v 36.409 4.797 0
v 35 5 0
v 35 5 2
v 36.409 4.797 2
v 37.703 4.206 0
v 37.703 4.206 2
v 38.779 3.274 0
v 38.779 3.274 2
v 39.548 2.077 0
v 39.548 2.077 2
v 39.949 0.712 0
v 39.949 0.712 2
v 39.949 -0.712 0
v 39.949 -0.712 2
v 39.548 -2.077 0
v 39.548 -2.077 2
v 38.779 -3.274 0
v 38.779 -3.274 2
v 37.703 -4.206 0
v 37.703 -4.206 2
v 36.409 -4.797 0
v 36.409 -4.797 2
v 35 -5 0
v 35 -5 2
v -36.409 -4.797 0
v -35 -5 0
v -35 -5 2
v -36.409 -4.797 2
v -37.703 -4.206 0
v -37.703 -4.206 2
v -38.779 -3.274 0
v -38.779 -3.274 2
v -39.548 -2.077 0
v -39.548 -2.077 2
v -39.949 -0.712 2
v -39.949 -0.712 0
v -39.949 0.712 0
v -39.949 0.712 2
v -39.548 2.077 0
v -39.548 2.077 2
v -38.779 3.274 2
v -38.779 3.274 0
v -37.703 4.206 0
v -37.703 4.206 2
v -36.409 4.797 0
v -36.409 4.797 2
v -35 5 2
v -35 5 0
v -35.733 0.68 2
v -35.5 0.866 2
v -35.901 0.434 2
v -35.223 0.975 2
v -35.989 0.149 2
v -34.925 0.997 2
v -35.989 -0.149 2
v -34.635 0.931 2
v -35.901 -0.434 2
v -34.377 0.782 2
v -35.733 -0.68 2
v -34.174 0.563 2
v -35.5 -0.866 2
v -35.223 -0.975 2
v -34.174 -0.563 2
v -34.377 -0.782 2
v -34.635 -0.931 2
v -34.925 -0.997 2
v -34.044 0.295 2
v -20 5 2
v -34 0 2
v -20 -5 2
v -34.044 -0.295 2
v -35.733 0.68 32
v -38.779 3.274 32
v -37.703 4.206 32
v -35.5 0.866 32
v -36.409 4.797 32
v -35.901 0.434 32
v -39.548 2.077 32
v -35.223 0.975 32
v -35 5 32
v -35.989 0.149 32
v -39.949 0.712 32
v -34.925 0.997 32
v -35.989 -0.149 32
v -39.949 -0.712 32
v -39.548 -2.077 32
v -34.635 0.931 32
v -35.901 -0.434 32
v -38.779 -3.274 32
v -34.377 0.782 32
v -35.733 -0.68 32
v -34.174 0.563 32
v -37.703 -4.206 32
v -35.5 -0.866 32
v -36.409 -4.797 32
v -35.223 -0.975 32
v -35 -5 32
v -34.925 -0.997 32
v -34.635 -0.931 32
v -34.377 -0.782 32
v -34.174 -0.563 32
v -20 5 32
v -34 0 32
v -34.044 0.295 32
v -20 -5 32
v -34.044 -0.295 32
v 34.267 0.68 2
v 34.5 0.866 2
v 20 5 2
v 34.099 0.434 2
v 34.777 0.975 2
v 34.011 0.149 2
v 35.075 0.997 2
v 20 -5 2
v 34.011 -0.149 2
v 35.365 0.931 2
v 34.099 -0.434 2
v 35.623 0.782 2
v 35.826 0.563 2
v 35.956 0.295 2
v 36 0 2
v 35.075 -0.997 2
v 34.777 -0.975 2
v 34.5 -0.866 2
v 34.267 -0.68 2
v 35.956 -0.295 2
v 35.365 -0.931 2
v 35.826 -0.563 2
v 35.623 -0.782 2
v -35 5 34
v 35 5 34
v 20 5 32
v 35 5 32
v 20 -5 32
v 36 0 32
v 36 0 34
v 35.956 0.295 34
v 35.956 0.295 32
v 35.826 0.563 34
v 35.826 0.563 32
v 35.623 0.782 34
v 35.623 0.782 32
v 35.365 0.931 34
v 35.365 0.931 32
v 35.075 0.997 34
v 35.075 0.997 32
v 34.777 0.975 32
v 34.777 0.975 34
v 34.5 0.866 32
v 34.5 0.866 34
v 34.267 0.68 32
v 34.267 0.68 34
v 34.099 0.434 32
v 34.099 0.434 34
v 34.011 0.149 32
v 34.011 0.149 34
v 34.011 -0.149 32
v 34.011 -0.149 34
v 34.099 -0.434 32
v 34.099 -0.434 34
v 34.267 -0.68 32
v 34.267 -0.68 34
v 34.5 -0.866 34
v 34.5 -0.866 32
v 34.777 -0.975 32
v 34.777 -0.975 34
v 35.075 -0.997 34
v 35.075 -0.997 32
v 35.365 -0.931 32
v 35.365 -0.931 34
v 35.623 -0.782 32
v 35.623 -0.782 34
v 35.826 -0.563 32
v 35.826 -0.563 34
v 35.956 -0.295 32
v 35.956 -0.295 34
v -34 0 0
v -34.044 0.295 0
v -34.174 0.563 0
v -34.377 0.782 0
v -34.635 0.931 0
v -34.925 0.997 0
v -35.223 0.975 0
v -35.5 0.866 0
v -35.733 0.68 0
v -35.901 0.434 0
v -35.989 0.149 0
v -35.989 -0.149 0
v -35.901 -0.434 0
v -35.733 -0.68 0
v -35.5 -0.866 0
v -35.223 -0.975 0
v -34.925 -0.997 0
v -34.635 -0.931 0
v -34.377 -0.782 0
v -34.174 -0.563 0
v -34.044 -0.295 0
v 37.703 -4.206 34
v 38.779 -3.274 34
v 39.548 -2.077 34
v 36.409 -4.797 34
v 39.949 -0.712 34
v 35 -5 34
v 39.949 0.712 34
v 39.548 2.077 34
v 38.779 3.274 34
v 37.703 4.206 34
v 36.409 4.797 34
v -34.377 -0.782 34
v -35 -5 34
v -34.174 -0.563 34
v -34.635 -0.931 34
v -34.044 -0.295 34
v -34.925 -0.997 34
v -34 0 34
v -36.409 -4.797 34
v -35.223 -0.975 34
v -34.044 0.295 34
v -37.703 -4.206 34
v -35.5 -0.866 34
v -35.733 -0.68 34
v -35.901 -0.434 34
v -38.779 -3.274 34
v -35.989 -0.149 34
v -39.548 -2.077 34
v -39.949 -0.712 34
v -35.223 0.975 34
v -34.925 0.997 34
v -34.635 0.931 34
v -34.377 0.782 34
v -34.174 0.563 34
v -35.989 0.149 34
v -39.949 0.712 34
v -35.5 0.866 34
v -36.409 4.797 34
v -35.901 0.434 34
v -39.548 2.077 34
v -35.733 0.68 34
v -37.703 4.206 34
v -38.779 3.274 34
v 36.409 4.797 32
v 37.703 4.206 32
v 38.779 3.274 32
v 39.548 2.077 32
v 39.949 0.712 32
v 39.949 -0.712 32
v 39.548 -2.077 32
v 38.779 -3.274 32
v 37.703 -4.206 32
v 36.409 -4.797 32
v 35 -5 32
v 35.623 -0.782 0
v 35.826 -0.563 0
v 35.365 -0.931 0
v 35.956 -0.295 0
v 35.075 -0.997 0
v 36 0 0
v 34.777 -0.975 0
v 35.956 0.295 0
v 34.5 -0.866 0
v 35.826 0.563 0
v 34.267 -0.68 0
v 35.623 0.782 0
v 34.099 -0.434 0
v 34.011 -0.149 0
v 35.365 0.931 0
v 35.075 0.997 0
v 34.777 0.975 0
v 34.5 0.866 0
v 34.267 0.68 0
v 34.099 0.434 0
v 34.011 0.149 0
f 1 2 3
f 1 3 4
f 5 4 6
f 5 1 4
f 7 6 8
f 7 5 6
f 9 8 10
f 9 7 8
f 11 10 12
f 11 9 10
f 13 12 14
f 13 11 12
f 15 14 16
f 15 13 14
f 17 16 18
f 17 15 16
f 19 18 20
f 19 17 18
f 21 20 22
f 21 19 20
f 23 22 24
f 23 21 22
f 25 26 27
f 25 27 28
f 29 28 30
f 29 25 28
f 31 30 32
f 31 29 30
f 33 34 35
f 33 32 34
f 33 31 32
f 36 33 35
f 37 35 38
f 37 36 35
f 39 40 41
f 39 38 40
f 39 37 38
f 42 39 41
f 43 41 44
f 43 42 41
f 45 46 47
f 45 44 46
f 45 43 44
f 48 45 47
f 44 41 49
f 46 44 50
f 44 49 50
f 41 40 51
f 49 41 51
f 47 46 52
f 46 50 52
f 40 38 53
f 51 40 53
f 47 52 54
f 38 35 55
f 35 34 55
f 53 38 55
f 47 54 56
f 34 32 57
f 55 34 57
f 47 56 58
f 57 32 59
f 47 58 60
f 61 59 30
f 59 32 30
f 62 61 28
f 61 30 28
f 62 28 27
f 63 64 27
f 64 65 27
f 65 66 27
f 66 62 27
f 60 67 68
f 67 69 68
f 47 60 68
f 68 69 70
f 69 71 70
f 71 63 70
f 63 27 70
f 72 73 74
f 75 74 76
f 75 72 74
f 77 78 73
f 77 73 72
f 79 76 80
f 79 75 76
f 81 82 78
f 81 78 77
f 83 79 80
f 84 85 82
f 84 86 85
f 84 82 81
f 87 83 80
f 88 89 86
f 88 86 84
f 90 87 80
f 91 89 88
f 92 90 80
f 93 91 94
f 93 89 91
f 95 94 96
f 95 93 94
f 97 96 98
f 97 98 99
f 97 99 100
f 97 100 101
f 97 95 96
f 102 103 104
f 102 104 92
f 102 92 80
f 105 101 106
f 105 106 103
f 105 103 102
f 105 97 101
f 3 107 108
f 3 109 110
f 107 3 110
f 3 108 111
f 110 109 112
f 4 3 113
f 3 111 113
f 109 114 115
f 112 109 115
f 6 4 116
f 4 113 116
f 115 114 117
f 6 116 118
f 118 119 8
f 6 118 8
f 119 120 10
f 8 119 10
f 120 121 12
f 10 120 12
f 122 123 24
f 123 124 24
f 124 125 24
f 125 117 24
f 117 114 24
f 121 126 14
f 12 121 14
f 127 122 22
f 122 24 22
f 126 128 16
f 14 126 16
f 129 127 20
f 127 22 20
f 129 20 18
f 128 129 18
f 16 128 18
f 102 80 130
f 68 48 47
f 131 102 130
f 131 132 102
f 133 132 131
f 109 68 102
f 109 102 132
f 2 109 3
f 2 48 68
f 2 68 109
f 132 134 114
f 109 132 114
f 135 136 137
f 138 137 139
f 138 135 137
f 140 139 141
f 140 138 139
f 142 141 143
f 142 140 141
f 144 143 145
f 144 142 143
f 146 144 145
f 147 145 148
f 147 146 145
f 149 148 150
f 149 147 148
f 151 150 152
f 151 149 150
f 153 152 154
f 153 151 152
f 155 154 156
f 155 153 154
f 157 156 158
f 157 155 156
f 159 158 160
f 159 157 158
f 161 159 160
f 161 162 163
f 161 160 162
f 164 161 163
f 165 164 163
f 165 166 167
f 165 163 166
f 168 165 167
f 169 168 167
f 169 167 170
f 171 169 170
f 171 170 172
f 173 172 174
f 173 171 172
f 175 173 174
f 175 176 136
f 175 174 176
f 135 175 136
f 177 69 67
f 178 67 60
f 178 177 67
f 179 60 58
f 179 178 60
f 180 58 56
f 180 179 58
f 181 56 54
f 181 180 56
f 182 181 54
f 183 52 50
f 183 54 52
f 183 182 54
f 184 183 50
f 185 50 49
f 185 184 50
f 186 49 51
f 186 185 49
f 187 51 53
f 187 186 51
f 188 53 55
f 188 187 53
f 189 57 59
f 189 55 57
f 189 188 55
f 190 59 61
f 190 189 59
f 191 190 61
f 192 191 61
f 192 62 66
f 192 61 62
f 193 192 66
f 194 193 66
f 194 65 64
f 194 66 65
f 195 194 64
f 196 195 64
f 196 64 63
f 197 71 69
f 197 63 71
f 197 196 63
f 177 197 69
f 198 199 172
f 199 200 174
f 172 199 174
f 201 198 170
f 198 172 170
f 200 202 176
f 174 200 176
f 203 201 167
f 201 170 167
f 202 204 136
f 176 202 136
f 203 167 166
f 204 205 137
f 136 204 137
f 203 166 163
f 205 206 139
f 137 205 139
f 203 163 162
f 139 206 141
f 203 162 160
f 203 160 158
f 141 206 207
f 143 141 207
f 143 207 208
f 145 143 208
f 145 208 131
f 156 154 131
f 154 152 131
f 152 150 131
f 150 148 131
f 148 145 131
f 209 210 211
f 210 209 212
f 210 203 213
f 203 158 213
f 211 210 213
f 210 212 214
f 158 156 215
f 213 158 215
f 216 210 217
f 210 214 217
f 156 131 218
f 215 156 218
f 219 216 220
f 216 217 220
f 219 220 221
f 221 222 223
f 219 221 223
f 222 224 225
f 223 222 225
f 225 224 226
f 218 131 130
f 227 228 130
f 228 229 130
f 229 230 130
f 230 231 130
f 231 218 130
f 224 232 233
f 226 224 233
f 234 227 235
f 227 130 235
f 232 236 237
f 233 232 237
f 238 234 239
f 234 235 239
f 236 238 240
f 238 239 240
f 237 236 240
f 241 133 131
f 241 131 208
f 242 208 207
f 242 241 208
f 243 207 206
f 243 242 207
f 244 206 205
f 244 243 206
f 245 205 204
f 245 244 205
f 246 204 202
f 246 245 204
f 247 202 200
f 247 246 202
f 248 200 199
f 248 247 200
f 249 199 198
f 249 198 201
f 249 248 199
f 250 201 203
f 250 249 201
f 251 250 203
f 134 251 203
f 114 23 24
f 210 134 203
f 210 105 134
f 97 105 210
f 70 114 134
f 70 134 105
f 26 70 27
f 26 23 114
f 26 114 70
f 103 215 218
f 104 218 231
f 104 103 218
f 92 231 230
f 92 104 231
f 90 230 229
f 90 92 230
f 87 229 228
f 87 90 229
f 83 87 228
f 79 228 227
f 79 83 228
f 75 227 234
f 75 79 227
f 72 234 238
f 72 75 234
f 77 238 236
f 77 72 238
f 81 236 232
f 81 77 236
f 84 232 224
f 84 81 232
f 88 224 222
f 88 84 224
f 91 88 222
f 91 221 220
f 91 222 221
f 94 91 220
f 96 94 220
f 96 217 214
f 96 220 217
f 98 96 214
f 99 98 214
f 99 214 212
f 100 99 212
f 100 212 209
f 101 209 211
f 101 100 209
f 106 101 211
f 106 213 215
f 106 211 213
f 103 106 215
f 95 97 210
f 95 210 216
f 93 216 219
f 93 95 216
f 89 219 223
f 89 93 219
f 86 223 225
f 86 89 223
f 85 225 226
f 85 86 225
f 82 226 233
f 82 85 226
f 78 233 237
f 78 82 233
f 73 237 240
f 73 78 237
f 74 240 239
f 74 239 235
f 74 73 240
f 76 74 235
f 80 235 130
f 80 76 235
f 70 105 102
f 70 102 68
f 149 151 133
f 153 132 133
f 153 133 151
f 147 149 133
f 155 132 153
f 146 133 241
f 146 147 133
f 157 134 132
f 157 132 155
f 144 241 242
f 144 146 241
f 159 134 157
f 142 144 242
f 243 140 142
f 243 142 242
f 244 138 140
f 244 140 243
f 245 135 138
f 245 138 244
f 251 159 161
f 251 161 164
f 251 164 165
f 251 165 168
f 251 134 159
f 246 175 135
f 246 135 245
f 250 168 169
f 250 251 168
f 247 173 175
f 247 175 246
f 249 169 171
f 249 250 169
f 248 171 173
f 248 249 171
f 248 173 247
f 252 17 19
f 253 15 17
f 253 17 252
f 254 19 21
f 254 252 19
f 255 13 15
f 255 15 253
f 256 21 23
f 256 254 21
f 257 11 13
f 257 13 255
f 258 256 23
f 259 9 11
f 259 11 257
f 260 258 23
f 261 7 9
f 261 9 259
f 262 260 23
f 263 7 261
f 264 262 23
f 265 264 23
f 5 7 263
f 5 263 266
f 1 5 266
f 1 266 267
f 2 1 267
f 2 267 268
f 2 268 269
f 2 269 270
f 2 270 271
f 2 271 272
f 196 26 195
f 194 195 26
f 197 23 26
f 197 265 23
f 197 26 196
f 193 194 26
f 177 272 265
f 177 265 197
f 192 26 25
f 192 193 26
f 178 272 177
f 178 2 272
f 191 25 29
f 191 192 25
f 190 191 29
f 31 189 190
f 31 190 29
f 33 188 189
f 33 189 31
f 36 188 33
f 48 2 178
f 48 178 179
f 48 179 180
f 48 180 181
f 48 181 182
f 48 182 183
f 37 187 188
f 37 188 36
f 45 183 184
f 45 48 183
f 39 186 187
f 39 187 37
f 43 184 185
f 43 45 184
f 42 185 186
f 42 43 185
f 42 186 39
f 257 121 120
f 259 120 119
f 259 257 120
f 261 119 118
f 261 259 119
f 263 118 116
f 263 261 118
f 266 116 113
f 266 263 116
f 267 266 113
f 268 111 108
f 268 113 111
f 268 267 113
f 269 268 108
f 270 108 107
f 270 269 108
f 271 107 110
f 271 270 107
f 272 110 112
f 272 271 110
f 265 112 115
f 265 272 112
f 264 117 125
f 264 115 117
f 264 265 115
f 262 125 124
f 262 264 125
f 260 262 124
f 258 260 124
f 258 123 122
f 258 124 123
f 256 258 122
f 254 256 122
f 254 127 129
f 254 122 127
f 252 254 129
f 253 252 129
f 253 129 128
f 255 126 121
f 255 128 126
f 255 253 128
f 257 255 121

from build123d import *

# Parameters (mm, degrees)
EXTRUDE_1_DEPTH          = 34
SKETCH_2_R               = 1
CUT_EXTRUDE_4_DEPTH      = 35
CUT_EXTRUDE_4_DEPTH_BACK = 30
SKETCH_3_W               = 20
SKETCH_3_H               = 30
CUT_EXTRUDE_5_DEPTH      = 30
CUT_EXTRUDE_5_DEPTH_BACK = 30


with BuildPart() as part:
    # 草圖1 → 填料-伸長1 (new body)
    with BuildSketch(Plane.XY):
        with BuildLine():
            Line((-35, 5), (35, 5))
            ThreePointArc((35, 5), (40, 0), (35, -5))
            Line((35, -5), (-35, -5))
            ThreePointArc((-35, -5), (-40, 0), (-35, 5))
        make_face()
    extrude(amount=EXTRUDE_1_DEPTH)

    # 草圖2 → 除料-伸長4 (cut, two sides)
    with BuildSketch(Plane.XY) as cut_extrude_4_sk:
        with Locations((-35, 0)):
            Circle(SKETCH_2_R)
        with Locations((35, 0)):
            Circle(SKETCH_2_R)
    extrude(amount=CUT_EXTRUDE_4_DEPTH, mode=Mode.SUBTRACT)
    extrude(cut_extrude_4_sk.sketch, amount=-CUT_EXTRUDE_4_DEPTH_BACK, mode=Mode.SUBTRACT)

    # 草圖3 → 除料-伸長5 (cut, two sides)
    with BuildSketch(Plane(origin=(0, 0, 0), x_dir=(1, 0, 0), z_dir=(0, 1, 0))) as cut_extrude_5_sk:
        with Locations((-30, -17)):
            Rectangle(SKETCH_3_W, SKETCH_3_H)
        with Locations((30, -17)):
            Rectangle(SKETCH_3_W, SKETCH_3_H)
    extrude(amount=CUT_EXTRUDE_5_DEPTH, mode=Mode.SUBTRACT)
    extrude(cut_extrude_5_sk.sketch, amount=-CUT_EXTRUDE_5_DEPTH_BACK, mode=Mode.SUBTRACT)


solid = part.part
